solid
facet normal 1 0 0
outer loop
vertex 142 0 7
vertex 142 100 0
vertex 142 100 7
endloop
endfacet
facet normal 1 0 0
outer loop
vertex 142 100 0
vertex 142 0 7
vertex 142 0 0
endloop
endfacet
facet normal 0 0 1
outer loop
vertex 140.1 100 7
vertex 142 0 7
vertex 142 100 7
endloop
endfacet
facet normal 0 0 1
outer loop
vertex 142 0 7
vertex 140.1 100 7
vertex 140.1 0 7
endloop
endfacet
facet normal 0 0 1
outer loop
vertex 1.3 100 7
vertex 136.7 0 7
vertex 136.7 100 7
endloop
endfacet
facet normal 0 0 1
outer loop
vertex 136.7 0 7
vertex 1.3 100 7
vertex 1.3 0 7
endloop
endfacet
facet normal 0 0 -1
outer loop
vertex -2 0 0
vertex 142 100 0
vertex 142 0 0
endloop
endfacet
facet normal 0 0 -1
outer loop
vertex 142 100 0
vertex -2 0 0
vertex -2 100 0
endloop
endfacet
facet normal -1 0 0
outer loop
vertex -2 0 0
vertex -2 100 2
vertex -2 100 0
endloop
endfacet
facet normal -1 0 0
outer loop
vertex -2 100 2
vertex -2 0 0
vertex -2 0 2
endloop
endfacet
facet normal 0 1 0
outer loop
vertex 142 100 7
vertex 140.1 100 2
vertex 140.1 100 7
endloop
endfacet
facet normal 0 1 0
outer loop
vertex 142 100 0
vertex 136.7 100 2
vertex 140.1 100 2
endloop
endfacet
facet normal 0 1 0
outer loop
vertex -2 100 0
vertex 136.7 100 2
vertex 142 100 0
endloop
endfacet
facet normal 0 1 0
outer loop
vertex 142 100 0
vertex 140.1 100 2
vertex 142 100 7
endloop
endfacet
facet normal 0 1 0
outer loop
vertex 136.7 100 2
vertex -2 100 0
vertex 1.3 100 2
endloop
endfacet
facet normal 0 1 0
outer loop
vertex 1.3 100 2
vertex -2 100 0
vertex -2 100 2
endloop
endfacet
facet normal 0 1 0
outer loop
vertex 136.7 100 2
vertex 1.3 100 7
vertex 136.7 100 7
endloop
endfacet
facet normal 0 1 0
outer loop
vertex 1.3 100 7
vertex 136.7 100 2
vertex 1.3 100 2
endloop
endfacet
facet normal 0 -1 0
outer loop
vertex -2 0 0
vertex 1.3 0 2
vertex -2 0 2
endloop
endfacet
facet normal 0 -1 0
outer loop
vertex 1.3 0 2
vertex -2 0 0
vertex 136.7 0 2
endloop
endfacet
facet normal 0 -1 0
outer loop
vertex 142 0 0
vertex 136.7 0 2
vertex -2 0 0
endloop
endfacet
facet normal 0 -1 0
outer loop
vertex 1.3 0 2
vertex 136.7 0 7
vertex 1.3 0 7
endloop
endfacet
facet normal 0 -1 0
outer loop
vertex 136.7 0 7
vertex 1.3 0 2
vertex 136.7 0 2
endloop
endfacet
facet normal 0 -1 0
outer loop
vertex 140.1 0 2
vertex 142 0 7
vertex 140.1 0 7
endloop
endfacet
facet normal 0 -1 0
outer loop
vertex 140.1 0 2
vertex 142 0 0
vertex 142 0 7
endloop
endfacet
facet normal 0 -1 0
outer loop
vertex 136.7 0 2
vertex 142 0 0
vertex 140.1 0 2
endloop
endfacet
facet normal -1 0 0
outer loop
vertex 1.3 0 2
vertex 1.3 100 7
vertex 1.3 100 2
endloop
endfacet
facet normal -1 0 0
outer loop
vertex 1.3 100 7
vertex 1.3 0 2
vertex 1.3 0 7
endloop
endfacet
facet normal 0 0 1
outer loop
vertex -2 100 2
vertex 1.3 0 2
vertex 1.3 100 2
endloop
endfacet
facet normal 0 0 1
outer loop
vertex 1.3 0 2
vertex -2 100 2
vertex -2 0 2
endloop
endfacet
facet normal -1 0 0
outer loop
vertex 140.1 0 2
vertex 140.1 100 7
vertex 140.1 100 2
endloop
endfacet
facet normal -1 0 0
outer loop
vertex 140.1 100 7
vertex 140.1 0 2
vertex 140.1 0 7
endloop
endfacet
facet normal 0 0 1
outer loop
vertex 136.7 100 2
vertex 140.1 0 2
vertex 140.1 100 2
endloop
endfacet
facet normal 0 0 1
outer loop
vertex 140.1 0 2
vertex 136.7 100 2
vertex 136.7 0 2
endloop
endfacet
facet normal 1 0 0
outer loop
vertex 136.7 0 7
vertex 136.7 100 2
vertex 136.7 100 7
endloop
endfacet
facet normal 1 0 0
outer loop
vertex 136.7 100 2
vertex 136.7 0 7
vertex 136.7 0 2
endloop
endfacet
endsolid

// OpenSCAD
// ============================================
// SLIDING LID — PT100 THERMOMETER
// All dimensions in mm
// ============================================

length = 140;
width  = 100;
wall   = 3;

// LID DIMENSIONS
lid_thickness = 7;
lid_overhang  = 2;

// FEMALE RAIL DIMENSIONS
groove_width = 3;
groove_depth = 5;
clearance    = 0.3;

// ============================================
// LID WITH FEMALE GROOVES
// ============================================

difference() {

    // Main lid plate
    translate([-lid_overhang, 0, 0])
        cube([
            length + 2*lid_overhang,
            width,
            lid_thickness
        ]);

    // Left female groove
    translate([
        -lid_overhang - 0.1,
        0,
        lid_thickness - groove_depth
    ])
        cube([
            wall + clearance + 0.1,
            width,
            groove_depth + 0.1
        ]);

    // Right female groove
    translate([
        length - wall - clearance,
        0,
        lid_thickness - groove_depth
    ])
        cube([
            wall + clearance + 0.1,
            width,
            groove_depth + 0.1
        ]);
}
